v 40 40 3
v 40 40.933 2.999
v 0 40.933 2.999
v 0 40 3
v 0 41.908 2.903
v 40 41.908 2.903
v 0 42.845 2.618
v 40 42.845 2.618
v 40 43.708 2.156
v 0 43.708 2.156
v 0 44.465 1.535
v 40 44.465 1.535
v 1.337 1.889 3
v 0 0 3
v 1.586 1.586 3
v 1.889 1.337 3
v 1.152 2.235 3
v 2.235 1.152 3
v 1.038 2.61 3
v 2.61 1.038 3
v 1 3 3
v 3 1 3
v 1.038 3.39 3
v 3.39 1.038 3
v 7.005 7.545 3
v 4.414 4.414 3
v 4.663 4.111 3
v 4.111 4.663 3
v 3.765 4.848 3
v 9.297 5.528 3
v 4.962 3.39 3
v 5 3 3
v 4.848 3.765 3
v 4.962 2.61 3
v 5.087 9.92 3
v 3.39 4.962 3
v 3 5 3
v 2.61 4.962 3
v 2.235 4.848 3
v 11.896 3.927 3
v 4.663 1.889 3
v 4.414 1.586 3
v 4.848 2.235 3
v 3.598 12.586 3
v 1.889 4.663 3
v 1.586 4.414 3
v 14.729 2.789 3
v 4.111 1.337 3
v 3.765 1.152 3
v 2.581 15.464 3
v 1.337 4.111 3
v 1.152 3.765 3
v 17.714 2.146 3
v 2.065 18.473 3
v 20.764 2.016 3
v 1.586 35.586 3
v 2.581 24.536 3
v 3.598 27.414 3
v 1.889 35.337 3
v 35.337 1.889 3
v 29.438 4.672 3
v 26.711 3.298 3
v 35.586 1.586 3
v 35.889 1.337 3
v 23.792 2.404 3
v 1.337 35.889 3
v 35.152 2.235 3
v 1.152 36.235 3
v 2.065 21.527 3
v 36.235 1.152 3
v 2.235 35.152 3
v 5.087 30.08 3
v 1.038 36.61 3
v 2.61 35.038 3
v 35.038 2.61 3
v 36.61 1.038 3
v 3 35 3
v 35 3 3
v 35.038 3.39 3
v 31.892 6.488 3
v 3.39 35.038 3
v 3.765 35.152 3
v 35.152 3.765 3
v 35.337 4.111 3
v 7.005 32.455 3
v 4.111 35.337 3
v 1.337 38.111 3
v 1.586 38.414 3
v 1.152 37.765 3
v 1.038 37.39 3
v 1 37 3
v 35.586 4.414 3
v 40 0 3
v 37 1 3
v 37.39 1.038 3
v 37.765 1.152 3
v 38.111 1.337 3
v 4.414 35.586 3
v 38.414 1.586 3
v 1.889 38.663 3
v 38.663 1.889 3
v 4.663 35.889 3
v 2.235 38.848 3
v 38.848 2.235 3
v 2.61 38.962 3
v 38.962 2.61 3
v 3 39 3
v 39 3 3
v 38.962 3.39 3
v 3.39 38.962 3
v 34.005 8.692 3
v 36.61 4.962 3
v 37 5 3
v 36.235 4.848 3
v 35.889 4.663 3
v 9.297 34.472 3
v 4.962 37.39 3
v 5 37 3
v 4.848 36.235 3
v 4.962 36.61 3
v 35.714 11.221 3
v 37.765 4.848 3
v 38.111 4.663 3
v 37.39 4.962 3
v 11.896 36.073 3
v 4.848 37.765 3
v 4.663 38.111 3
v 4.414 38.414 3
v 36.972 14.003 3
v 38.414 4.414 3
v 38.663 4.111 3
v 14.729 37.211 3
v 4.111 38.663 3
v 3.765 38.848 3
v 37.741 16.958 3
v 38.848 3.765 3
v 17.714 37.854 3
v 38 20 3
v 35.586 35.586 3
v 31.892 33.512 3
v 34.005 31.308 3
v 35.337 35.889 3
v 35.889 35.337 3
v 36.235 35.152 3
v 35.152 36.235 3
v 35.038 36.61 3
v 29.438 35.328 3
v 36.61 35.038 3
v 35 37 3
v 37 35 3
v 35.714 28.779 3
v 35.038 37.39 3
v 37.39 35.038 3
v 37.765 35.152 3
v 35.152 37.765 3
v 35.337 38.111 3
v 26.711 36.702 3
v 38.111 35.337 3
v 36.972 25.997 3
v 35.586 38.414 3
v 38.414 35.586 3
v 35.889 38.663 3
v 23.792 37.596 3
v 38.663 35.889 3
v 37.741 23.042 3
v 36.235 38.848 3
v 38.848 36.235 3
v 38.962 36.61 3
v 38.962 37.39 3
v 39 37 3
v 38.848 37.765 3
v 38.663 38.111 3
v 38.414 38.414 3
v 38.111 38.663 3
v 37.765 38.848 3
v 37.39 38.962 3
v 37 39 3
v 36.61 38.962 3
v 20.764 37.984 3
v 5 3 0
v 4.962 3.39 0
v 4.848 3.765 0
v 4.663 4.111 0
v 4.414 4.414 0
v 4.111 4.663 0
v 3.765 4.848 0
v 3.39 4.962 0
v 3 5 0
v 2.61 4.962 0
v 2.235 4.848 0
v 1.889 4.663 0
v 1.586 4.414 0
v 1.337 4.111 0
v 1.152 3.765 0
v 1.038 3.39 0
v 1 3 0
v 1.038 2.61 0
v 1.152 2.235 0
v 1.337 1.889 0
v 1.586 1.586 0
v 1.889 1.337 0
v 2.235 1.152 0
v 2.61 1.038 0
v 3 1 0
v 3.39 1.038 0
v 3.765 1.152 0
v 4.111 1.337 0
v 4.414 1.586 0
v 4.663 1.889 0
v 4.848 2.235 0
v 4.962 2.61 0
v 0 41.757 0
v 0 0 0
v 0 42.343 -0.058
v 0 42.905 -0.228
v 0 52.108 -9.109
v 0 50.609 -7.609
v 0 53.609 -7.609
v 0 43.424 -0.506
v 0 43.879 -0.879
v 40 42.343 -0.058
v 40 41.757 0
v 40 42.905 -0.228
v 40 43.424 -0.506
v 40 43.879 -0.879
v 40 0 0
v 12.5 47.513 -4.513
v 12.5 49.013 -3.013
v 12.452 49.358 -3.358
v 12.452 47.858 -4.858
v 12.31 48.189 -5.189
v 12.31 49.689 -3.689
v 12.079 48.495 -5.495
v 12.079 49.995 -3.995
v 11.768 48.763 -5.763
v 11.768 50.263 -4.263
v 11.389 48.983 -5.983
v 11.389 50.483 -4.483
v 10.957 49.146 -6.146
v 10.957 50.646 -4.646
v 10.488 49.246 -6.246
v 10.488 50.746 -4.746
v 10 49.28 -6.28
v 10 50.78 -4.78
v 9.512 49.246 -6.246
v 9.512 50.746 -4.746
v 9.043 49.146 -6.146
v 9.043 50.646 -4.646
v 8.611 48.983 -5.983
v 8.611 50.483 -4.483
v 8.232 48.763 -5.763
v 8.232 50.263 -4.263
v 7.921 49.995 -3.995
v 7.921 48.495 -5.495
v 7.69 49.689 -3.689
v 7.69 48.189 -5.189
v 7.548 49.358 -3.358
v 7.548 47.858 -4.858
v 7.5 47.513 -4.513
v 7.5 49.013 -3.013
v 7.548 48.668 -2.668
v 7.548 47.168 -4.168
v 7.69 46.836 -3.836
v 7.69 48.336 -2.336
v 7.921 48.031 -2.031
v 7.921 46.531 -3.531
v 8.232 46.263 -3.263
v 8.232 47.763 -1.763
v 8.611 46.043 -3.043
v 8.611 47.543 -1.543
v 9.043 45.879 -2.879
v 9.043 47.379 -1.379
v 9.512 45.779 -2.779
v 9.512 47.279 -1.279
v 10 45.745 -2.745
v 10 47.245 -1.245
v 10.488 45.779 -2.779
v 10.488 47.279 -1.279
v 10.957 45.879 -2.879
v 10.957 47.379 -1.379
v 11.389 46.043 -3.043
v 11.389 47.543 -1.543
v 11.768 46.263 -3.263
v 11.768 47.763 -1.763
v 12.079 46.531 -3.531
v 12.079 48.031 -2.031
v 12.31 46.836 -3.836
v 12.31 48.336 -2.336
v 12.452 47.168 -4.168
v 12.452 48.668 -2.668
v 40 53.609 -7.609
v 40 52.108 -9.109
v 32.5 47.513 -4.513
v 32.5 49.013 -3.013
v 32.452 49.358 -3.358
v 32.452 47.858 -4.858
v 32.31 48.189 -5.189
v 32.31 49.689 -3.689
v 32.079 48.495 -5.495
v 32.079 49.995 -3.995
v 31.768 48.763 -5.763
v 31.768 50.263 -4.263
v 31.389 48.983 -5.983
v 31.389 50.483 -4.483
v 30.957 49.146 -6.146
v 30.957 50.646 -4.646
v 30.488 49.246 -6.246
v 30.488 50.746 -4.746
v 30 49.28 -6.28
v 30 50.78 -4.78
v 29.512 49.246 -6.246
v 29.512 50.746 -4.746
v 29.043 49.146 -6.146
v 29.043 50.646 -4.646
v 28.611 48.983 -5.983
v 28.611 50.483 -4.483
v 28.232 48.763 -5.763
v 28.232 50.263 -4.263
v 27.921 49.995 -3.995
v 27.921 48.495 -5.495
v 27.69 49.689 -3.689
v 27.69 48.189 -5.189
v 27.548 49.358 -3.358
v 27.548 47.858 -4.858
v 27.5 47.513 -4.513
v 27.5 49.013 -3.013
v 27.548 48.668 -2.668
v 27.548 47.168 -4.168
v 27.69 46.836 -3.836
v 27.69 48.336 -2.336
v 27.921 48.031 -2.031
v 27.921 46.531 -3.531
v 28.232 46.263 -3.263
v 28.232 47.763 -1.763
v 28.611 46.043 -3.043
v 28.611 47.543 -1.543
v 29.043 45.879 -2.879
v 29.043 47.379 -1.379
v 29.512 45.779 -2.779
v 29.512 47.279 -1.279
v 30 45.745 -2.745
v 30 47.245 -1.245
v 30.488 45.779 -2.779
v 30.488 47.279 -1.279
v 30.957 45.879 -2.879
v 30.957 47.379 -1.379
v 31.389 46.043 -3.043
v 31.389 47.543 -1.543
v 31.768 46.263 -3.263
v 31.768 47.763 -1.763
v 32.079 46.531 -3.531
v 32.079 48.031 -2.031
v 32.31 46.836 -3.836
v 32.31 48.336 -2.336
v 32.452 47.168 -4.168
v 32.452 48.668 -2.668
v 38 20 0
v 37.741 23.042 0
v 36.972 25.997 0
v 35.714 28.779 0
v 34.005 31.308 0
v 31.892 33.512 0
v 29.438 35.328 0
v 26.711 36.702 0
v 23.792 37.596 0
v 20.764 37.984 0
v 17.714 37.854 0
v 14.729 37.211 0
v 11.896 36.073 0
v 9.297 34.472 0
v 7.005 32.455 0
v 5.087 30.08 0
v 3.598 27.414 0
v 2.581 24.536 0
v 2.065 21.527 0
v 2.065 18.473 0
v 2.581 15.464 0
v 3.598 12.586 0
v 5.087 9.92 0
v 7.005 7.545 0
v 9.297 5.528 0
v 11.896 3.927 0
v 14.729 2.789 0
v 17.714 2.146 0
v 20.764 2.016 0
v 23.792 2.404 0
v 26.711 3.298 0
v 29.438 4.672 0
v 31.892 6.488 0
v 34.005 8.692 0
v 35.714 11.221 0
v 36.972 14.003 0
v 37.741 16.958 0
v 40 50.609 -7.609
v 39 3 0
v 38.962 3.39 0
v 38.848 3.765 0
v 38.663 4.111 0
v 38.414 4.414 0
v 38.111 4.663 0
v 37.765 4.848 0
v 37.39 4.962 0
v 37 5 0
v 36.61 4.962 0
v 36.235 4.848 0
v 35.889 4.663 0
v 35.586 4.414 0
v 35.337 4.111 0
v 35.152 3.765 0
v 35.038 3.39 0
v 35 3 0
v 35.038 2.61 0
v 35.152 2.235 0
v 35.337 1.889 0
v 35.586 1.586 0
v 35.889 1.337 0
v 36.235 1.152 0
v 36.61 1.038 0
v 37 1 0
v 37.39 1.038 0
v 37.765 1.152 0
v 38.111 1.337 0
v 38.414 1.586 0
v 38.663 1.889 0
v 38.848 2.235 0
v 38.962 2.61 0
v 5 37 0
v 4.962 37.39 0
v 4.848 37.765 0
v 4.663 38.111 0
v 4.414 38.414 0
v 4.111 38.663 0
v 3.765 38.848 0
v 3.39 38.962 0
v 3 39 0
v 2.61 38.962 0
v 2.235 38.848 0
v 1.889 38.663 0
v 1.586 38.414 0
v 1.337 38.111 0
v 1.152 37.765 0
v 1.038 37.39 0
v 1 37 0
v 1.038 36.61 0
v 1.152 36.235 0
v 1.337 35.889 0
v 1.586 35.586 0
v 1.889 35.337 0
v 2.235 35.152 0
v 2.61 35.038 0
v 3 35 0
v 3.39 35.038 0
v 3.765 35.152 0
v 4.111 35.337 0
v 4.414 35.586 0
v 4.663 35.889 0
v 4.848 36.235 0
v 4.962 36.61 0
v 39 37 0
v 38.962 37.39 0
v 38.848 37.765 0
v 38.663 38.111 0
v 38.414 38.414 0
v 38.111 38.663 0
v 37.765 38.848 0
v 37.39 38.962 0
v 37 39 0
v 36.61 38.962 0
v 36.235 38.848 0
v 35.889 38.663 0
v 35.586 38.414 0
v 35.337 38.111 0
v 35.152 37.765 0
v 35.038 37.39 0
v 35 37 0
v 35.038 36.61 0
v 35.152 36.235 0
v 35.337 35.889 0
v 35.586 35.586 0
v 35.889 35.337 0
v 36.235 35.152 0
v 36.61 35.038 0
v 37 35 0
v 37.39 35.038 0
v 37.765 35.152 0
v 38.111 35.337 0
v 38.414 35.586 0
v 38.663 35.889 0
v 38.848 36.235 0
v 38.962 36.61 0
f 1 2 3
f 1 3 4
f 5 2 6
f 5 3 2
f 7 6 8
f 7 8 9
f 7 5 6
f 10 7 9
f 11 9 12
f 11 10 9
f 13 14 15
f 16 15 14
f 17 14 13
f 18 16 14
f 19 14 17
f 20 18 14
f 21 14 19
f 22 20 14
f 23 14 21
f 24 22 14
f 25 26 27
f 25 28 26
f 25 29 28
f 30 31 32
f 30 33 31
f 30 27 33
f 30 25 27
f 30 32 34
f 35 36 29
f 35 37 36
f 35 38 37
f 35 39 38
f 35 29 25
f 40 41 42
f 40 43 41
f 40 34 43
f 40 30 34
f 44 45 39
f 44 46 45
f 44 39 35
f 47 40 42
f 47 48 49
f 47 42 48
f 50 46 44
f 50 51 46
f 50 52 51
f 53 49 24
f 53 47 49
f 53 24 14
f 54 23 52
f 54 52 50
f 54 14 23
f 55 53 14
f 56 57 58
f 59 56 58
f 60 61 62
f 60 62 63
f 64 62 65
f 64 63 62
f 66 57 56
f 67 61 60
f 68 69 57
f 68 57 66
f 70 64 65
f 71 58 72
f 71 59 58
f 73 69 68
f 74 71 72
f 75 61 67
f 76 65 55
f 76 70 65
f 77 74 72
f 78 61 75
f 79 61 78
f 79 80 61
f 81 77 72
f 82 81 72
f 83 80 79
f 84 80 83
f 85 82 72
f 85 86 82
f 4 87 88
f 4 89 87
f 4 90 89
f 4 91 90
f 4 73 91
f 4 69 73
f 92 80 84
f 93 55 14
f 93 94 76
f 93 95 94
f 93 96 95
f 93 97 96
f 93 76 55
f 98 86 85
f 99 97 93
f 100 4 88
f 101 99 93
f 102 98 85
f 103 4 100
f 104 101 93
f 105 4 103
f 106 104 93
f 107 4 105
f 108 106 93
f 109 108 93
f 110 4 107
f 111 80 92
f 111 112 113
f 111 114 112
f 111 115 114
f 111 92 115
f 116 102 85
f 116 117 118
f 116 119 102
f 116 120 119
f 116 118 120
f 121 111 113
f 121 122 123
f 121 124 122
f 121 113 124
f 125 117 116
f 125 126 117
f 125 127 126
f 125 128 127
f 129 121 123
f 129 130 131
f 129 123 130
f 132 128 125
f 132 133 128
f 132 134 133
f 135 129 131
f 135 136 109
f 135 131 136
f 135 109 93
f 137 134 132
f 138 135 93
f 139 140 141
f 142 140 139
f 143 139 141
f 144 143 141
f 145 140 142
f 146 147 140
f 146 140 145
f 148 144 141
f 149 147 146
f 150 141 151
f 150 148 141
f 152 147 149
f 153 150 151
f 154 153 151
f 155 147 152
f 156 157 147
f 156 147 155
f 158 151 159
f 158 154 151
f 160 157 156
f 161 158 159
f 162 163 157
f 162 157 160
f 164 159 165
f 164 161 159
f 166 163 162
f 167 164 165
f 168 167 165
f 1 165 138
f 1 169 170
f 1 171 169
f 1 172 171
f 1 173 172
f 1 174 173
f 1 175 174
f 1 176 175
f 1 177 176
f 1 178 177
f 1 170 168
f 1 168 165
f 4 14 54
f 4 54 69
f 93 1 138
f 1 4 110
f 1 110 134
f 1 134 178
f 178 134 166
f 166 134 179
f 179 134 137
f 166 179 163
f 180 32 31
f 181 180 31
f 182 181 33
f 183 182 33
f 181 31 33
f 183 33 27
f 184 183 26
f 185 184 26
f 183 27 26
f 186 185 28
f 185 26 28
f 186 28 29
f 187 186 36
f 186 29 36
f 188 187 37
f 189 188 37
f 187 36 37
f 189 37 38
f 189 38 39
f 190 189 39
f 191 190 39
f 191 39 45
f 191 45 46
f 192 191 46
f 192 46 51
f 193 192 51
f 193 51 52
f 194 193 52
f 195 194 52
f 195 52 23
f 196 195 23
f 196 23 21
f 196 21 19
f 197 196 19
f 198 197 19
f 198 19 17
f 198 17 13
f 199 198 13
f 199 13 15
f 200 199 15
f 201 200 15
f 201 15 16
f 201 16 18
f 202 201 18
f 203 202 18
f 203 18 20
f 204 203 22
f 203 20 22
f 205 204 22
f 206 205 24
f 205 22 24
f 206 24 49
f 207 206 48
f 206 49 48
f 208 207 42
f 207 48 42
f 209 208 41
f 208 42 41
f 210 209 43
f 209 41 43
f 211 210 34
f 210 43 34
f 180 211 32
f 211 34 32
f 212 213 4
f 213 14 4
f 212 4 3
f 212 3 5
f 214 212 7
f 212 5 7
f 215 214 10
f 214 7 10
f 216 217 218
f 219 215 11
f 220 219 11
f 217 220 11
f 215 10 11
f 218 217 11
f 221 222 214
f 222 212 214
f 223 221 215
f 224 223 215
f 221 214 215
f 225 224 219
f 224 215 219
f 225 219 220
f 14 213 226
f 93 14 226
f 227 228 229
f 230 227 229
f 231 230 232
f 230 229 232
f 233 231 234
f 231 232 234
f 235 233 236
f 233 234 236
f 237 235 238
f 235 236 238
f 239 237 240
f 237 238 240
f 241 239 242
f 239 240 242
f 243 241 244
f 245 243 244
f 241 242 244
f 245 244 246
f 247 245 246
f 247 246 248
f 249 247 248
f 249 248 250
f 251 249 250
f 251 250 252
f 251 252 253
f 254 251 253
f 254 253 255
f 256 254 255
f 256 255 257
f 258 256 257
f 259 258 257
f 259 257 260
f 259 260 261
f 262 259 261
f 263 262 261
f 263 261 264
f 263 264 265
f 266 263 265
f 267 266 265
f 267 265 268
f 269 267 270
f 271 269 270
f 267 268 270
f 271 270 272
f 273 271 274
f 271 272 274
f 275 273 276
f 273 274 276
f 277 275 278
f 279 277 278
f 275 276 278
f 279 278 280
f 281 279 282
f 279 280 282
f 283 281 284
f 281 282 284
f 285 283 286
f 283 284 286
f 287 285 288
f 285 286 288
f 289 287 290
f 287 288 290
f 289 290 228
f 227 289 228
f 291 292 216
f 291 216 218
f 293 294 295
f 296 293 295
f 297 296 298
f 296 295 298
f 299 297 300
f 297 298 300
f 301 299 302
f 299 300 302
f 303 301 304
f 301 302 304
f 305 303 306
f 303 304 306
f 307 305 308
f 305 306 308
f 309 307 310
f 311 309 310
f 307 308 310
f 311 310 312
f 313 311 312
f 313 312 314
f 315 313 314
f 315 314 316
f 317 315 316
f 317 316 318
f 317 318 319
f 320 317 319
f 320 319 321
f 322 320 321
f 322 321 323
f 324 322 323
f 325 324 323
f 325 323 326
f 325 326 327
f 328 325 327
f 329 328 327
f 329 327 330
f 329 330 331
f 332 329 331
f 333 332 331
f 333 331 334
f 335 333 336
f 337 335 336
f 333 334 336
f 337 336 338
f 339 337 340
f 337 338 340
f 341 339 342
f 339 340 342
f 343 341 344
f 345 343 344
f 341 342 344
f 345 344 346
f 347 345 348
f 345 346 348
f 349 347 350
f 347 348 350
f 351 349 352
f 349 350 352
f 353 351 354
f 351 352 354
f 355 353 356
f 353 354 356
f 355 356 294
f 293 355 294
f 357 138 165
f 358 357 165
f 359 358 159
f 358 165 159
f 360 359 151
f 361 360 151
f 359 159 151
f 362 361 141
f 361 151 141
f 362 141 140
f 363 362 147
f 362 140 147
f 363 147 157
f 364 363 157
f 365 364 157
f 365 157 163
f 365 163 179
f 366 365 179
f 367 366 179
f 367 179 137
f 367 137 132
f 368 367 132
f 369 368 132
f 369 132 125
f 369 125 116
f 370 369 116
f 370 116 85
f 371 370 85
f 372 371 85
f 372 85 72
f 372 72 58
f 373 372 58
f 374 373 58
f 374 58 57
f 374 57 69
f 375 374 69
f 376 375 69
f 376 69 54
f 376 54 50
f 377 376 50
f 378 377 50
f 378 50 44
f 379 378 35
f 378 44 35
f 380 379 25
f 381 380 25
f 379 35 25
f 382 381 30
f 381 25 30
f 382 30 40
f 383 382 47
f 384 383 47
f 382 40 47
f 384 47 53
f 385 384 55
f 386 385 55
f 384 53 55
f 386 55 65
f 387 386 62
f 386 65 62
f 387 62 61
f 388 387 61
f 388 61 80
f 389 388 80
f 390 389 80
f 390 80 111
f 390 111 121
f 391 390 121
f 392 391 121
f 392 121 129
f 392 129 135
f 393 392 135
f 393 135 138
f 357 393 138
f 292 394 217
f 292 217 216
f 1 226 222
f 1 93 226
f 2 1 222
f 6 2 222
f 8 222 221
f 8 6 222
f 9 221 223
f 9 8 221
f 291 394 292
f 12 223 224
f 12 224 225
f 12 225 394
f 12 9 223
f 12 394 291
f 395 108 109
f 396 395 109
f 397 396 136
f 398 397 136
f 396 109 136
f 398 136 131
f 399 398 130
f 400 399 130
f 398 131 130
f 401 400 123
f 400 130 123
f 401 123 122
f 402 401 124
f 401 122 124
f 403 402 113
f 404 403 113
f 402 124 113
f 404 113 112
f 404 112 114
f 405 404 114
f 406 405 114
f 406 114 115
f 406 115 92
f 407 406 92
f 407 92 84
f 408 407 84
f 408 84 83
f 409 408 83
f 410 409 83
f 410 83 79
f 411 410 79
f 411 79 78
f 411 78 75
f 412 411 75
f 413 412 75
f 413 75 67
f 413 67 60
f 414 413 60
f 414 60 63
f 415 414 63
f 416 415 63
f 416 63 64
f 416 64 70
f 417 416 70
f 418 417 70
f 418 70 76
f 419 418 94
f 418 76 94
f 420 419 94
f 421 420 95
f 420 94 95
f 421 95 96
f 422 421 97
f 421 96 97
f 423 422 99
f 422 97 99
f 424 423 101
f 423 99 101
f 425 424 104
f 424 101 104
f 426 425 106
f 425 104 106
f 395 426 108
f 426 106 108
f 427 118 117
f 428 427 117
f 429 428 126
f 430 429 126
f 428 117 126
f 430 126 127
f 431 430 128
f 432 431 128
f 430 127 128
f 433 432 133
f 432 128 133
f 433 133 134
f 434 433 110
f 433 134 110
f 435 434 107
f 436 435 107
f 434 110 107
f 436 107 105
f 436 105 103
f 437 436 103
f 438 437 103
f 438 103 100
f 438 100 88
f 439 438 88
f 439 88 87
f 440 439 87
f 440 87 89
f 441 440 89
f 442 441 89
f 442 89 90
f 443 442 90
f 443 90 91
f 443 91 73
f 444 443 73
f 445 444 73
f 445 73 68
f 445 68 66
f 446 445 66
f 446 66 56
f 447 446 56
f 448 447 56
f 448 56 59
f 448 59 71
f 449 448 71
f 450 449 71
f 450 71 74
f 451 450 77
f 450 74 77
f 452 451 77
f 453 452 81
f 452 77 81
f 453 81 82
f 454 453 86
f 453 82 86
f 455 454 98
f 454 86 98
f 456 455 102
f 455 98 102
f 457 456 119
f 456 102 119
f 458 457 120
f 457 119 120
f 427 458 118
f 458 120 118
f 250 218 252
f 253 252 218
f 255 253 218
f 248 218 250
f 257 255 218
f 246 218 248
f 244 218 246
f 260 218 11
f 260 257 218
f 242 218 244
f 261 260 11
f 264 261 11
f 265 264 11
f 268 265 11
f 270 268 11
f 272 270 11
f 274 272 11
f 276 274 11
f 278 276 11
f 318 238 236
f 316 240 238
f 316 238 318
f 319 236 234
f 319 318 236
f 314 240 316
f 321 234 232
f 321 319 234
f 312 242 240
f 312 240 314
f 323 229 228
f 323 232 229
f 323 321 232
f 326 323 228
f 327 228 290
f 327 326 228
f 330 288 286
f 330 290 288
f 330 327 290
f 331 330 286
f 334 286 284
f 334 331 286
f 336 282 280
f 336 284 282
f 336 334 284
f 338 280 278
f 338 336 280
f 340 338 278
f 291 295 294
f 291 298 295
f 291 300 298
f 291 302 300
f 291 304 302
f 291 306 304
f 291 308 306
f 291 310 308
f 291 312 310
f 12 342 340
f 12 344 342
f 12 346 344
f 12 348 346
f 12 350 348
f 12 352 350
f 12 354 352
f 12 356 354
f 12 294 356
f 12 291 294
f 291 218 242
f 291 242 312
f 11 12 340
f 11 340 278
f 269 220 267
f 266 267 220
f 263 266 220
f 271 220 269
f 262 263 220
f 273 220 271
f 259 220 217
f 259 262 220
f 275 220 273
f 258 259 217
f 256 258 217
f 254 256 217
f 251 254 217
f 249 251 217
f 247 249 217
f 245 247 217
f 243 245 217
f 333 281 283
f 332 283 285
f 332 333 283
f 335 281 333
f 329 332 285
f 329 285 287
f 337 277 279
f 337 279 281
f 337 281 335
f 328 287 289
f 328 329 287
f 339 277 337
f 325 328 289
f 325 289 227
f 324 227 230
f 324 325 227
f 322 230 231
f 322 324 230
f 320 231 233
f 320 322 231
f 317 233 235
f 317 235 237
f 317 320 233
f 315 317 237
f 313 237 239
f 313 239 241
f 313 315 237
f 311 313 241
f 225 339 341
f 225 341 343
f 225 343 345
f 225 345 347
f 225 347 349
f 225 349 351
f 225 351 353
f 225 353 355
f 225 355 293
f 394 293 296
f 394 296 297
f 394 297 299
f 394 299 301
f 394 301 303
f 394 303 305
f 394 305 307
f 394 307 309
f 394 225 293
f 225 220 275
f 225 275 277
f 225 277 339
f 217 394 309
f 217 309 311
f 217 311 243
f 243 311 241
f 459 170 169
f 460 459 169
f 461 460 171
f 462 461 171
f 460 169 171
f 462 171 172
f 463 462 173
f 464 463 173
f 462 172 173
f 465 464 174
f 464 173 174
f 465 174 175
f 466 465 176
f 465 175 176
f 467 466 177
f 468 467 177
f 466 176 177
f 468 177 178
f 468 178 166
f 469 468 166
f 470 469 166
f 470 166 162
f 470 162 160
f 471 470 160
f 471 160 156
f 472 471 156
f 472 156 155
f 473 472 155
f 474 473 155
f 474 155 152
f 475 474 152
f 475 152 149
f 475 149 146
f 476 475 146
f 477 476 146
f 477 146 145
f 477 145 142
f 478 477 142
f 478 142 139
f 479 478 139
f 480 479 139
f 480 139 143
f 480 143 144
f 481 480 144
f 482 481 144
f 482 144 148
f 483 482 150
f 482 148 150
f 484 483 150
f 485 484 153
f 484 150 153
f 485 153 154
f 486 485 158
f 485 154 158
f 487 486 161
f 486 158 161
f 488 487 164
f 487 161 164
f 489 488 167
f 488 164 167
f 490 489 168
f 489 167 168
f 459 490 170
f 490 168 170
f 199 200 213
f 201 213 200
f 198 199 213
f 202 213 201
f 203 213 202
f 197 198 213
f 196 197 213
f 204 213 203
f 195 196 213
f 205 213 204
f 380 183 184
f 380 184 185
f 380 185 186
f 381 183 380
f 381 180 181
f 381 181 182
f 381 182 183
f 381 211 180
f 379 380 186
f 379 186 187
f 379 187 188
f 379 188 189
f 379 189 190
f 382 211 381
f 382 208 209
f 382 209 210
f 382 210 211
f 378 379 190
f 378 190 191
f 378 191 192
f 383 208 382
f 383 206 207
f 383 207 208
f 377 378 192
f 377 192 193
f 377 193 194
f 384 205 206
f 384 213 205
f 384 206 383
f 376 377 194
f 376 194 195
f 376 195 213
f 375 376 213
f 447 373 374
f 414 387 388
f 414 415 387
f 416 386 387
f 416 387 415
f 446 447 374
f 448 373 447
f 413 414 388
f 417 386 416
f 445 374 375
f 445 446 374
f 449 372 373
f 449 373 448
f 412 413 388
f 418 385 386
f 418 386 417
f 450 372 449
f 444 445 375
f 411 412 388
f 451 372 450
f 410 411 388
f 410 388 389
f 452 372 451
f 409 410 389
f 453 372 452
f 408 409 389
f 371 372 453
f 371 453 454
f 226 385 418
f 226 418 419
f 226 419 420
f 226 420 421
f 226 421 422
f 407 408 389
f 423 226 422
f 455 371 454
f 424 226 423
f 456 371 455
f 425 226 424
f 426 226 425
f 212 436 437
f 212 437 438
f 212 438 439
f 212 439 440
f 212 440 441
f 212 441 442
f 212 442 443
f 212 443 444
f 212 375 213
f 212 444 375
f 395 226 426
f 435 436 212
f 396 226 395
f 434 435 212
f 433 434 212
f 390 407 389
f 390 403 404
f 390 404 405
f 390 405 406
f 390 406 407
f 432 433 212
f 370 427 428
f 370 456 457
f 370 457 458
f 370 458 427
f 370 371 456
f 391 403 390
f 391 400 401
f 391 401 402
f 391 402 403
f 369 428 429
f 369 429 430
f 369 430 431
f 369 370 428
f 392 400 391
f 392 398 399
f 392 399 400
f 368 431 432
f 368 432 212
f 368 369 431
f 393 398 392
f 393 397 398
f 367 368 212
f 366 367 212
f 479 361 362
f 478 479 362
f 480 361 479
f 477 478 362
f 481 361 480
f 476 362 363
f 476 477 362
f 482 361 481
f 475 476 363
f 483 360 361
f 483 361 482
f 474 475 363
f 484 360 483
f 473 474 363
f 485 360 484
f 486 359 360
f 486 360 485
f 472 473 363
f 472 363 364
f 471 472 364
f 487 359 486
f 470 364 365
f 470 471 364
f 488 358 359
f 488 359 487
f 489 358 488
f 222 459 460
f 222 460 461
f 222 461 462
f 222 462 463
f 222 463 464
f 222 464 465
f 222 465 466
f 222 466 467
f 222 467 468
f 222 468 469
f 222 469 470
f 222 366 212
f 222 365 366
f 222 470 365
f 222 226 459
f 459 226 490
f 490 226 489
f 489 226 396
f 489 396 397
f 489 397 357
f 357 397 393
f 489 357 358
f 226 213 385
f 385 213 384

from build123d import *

# Parameters (mm, degrees)
F0_W      = 40
F0_H      = 40
F1_DEPTH  = 3
F2_R      = 18
F3_DEPTH  = 3.001
F4_R      = 2
F5_DEPTH  = 3.001
F7_DEPTH  = 40
F8_R      = 5
F9_R      = 2.5
F10_DEPTH = 38.969286
F11_R     = 3


with BuildPart() as f1:
    # F0 (on Top) → F1 (new body)
    with BuildSketch(Plane.XY):
        with Locations((20, 20)):
            Rectangle(F0_W, F0_H)
    extrude(amount=F1_DEPTH)

    # F2 (on face) → F3 (cut, through all)
    with BuildSketch(Plane.XY.offset(3)):
        with Locations((20, 20)):
            Circle(F2_R)
    extrude(amount=-F3_DEPTH, mode=Mode.SUBTRACT)

    # F4 (on face) → F5 (cut, through all)
    with BuildSketch(Plane.XY.offset(3)):
        with Locations((3, 37)):
            Circle(F4_R)
        with Locations((3, 3)):
            Circle(F4_R)
        with Locations((37, 37)):
            Circle(F4_R)
        with Locations((37, 3)):
            Circle(F4_R)
    extrude(amount=-F5_DEPTH, mode=Mode.SUBTRACT)

    # F6 (on face) → F7 (join)
    with BuildSketch(Plane.YZ.offset(40)):
        Polygon((43.002259, 2.997741), (40, 3), (43, 0), (50.608861, -7.608861), (53.608861, -7.608861), align=None)
        Polygon((43, 0), (40, 3), (40, 0), align=None)
        Polygon((52.108244, -9.109478), (53.608861, -7.608861), (50.608861, -7.608861), align=None)
    extrude(amount=-F7_DEPTH)

    # F8
    f8_edges = [f1.edges().sort_by_distance(p)[0] for p in [
        (20, 43.002259, 2.997741),
    ]]
    fillet(f8_edges, radius=F8_R)

    # F9 (on face) → F10 (cut, through all)
    with BuildSketch(Plane(origin=(0, 23, 23), x_dir=(1, 0, 0), z_dir=(0, 0.707107, 0.707107))):
        with Locations((30, 36.787466)):
            Circle(F9_R)
        with Locations((10, 36.787466)):
            Circle(F9_R)
    extrude(amount=-F10_DEPTH, mode=Mode.SUBTRACT)

    # F11
    f11_edges = [f1.edges().sort_by_distance(p)[0] for p in [
        (20, 43, 0),
    ]]
    fillet(f11_edges, radius=F11_R)


solid = f1.part
